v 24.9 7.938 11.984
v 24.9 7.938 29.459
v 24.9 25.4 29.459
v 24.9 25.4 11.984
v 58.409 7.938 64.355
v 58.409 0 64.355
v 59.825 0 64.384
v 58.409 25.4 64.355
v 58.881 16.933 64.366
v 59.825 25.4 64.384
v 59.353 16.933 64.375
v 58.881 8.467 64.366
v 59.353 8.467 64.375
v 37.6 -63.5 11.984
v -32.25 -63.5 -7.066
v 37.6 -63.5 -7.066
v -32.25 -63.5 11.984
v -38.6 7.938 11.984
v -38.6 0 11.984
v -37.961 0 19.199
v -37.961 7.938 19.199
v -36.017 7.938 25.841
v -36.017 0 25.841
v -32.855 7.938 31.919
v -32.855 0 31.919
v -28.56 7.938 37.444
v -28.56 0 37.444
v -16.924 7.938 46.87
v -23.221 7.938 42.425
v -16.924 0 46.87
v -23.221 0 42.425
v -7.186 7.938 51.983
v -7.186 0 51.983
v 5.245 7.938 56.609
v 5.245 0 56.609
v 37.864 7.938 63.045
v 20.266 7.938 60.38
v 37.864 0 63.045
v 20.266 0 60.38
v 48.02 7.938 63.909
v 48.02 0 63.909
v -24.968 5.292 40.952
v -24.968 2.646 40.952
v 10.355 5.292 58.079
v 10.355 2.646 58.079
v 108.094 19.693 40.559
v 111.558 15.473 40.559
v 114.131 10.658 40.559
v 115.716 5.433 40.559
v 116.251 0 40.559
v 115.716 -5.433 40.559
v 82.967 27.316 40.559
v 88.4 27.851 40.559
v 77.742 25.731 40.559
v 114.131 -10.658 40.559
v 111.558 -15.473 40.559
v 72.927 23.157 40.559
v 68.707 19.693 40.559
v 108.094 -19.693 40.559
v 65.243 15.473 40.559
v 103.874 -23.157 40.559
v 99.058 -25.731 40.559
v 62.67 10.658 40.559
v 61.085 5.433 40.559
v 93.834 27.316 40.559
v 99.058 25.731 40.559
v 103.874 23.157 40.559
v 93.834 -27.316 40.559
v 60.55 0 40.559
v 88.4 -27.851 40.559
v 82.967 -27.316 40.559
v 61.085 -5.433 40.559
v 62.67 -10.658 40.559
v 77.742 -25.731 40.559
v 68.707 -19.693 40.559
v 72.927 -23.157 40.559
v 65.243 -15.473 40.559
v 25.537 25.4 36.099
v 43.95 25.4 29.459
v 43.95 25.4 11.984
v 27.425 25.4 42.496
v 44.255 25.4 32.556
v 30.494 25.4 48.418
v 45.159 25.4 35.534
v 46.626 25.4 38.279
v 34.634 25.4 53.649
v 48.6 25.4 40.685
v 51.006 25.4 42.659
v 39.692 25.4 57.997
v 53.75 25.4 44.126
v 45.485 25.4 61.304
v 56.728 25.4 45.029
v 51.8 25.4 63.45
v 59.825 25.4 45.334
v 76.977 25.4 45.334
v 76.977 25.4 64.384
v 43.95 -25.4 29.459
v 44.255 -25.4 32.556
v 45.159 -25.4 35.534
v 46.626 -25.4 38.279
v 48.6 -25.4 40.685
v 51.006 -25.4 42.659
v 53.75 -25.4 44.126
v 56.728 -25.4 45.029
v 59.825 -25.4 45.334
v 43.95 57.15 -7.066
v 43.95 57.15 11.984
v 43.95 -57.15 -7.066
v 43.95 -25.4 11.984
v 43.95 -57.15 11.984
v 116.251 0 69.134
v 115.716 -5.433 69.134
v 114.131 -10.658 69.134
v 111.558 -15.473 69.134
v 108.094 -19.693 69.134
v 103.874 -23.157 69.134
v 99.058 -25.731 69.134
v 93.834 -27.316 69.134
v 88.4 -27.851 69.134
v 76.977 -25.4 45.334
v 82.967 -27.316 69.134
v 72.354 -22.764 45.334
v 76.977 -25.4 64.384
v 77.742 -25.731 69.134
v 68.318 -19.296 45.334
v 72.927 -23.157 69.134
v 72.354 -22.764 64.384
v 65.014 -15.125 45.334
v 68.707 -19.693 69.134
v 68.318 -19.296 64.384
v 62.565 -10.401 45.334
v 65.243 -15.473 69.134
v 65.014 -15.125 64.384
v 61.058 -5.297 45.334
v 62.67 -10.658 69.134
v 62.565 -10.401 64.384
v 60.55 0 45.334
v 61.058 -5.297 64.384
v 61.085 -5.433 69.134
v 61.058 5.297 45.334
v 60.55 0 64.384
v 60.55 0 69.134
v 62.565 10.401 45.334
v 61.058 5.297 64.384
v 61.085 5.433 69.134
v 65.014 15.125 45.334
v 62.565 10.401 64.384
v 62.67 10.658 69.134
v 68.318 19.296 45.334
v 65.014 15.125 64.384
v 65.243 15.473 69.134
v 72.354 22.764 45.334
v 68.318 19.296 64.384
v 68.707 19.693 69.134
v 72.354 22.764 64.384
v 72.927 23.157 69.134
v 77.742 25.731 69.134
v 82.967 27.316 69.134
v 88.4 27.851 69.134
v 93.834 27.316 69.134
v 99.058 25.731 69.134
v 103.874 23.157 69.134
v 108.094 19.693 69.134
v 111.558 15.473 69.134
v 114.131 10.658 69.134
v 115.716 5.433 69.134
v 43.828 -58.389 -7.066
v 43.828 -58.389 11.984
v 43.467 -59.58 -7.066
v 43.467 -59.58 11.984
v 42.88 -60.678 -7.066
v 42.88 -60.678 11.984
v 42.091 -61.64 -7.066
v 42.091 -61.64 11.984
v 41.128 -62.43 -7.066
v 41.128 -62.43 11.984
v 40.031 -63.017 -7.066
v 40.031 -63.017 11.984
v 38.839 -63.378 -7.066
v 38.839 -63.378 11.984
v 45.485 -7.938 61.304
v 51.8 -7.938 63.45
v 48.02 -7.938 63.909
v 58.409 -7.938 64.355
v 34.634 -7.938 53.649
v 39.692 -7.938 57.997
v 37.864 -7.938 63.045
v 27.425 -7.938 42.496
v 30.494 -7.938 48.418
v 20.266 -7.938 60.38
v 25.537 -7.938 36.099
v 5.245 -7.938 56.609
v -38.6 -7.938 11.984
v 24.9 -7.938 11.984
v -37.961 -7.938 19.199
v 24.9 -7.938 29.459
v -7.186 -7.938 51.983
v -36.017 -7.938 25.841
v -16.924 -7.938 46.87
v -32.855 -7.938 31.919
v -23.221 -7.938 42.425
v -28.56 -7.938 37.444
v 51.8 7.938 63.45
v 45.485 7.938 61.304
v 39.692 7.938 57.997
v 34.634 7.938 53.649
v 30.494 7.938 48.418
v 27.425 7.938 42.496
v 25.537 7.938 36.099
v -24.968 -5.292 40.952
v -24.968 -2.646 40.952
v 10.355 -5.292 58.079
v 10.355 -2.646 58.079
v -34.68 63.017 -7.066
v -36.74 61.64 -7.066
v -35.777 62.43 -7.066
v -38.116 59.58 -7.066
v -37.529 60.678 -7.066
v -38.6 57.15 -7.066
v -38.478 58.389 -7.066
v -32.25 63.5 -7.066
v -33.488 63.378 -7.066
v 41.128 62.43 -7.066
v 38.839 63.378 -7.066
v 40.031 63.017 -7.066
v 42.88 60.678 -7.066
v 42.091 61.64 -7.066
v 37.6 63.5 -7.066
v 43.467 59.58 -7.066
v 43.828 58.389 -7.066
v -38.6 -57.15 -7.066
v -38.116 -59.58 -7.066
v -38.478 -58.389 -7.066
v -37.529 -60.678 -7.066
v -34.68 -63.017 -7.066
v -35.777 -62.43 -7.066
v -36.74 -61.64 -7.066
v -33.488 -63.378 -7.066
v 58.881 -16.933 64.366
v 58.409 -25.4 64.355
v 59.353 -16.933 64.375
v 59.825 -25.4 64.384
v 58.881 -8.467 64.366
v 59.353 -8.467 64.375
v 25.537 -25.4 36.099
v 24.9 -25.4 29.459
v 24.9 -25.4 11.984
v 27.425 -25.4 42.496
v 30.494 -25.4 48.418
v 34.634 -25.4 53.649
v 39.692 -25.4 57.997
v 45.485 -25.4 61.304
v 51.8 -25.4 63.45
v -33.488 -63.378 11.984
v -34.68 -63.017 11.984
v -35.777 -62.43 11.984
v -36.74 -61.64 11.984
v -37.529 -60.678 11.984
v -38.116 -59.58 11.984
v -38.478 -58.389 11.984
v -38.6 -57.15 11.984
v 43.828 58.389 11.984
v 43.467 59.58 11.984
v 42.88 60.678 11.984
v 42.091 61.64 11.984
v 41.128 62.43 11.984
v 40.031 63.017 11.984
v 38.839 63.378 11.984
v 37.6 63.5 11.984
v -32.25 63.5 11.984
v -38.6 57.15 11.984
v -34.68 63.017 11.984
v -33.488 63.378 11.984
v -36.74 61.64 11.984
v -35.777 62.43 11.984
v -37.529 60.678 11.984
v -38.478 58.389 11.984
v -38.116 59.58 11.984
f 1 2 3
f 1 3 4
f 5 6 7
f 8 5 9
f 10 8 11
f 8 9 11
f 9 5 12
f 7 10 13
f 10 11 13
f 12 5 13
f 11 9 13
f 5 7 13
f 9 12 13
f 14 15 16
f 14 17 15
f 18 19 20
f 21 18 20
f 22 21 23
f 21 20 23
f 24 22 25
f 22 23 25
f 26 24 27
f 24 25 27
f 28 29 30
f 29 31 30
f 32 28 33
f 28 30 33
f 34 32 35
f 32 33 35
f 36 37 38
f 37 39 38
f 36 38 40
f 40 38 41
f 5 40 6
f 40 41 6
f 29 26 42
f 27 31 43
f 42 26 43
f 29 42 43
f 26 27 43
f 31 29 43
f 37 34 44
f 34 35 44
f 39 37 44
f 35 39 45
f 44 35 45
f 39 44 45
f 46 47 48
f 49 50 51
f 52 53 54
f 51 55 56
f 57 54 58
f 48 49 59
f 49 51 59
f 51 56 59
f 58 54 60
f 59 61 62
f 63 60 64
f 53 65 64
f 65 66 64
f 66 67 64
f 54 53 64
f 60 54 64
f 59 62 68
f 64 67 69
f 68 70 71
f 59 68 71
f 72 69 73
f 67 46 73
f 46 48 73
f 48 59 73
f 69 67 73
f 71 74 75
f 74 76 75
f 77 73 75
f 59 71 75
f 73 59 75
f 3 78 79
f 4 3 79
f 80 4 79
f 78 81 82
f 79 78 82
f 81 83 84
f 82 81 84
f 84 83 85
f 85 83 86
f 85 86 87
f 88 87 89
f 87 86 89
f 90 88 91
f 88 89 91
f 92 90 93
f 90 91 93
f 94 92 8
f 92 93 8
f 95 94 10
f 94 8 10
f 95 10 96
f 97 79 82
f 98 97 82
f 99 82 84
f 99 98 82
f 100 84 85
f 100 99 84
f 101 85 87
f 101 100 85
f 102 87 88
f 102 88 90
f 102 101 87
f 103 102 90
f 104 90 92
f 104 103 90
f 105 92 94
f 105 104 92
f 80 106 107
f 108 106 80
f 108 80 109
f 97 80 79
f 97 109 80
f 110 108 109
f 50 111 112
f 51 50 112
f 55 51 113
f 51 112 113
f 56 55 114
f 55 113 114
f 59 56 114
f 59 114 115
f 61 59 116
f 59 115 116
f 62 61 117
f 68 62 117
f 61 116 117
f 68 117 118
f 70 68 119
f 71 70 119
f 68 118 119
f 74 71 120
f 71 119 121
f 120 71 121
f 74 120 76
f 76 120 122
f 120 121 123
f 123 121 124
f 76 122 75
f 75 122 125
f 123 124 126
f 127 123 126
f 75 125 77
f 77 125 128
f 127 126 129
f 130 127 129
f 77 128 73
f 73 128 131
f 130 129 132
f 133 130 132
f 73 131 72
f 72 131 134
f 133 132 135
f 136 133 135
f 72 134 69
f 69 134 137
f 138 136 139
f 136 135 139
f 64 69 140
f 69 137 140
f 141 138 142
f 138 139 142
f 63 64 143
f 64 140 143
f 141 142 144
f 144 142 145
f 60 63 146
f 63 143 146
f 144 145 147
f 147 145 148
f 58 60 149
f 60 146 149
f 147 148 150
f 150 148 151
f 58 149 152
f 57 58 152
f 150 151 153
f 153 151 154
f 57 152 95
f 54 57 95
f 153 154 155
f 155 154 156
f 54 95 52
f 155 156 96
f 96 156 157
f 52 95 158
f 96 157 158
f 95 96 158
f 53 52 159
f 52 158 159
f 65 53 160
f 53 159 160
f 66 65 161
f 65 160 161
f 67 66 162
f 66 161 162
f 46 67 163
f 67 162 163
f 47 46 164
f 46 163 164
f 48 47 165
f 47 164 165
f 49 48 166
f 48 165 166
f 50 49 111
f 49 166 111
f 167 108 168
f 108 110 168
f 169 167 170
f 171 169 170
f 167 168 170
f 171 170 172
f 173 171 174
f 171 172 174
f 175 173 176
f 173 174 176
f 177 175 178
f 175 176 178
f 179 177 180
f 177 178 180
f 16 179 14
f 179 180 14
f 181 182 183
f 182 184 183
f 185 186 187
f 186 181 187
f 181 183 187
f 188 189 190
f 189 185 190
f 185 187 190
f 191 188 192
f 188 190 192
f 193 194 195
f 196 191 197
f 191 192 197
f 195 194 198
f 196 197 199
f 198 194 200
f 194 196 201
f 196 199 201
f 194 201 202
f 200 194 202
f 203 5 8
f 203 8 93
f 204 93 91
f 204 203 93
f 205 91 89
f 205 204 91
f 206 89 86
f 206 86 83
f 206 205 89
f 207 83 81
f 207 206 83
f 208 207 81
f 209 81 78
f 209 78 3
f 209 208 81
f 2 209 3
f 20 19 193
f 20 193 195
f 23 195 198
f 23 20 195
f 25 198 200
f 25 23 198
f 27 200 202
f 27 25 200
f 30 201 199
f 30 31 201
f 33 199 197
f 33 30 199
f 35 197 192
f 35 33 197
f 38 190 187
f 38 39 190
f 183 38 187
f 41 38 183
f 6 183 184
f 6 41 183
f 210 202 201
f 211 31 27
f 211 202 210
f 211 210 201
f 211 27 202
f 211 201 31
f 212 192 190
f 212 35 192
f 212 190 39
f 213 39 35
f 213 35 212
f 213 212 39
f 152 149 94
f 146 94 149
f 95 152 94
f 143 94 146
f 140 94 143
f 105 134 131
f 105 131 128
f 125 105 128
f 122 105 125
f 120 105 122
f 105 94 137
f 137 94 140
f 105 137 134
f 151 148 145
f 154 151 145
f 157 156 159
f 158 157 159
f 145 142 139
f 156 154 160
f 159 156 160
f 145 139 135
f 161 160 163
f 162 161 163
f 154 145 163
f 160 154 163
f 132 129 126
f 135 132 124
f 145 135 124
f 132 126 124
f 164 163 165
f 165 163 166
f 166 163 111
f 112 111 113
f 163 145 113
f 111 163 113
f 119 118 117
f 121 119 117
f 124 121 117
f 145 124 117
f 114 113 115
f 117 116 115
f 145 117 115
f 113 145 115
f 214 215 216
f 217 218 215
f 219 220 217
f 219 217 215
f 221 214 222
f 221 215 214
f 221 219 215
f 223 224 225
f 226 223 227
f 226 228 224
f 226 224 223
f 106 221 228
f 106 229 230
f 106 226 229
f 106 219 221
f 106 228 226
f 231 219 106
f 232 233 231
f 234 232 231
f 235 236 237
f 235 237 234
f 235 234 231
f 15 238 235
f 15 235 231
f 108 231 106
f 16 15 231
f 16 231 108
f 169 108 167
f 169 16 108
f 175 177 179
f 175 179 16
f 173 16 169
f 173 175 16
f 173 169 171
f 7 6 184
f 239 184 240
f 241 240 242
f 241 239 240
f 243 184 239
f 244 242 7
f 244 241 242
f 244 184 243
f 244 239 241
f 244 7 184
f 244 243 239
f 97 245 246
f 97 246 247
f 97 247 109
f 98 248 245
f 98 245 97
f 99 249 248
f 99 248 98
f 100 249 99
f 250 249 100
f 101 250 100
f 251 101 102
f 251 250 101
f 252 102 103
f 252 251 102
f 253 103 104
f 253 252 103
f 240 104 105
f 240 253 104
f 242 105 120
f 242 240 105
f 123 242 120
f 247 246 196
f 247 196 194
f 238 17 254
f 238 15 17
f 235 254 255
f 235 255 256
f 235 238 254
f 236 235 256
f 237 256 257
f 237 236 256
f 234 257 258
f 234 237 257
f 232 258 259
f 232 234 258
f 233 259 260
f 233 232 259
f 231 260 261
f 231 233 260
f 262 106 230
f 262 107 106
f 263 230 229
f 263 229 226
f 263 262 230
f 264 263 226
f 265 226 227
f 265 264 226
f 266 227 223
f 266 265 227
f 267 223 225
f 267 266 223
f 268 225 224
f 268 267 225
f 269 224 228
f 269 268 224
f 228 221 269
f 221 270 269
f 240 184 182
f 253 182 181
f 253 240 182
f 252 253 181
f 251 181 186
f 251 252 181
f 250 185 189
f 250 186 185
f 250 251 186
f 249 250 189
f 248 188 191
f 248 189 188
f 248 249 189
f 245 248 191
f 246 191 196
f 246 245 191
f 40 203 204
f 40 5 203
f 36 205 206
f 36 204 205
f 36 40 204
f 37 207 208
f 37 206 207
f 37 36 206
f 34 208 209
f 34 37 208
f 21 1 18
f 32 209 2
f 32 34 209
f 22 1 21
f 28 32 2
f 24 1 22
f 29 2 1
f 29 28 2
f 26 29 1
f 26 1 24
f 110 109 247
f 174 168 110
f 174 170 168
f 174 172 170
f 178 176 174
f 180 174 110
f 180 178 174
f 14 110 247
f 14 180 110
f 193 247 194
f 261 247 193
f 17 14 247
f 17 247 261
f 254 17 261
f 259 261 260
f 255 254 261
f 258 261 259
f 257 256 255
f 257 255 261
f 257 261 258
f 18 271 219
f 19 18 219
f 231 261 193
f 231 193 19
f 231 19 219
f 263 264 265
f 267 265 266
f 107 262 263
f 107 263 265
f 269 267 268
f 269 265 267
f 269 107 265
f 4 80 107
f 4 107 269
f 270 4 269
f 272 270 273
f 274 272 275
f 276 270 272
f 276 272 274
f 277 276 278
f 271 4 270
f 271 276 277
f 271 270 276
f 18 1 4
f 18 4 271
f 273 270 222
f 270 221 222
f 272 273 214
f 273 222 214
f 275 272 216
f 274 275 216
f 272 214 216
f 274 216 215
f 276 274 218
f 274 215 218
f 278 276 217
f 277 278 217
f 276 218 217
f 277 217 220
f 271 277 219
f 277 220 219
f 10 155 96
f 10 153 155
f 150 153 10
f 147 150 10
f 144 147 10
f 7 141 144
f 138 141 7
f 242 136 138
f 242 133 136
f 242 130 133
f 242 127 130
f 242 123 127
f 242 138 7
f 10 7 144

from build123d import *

# Parameters (mm, degrees)
F1_DEPTH = 63.5
F2_DEPTH = 25.4
F3_DEPTH = 7.9375
F5_R     = 6.35


# Not quite as in the source:
# - a feature names something its author has since deleted; it is built from what else it names


with BuildPart() as f1:
    # F0 (on Front) → F1 (new body, symmetric)
    with BuildSketch(Plane.XZ):
        Polygon((24.9004629219, 11.984025088), (-38.5995370781, 11.984025088), (-38.5995370781, -7.065974912), (43.9504629219, -7.065974912), (43.9504629219, 11.984025088), align=None)
    extrude(amount=F1_DEPTH, both=True)

    # F0 (on Front) → F2 (join, symmetric)
    with BuildSketch(Plane.XZ):
        with BuildLine():
            Line((24.9004629219, 29.459225088), (24.9004629219, 11.984025088))
            Line((24.9004629219, 11.984025088), (43.9504629219, 11.984025088))
            Line((43.9504629219, 11.984025088), (43.9504629219, 29.459225088))
            ThreePointArc((43.9504629219, 29.459225088), (48.6001427706, 40.6845452393), (59.8254629219, 45.334225088))
            Line((59.8254629219, 45.334225088), (65.5219778419, 45.334225088))
            Line((65.5219778419, 45.334225088), (88.4004629219, 45.334225088))
            Line((88.4004629219, 45.334225088), (88.4004629219, 64.384225088))
            Line((88.4004629219, 64.384225088), (65.4512095848, 64.384225088))
            Line((65.4512095848, 64.384225088), (59.8254629219, 64.384225088))
            add(Edge.make_bspline(
                [(58.4085351023, 64.3554704527), (58.8803787931, 64.3662992509), (59.3526984445, 64.3758829837), (59.8254629219, 64.384225088)],
                knots=[110.4908750185, 110.4908750185, 110.4908750185, 110.4908750185, 111.5045361635, 111.5045361635, 111.5045361635, 111.5045361635], degree=3))
            ThreePointArc((58.4085351023, 64.3554704527), (34.6337794817, 53.6487829684), (24.9004629219, 29.459225088))
        make_face()
    extrude(amount=F2_DEPTH, both=True)

    # F0 (on Front) → F3 (join, symmetric)
    with BuildSketch(Plane.XZ):
        with BuildLine():
            add(Edge.make_bspline(
                [(-38.5995370781, 11.984025088), (-38.8000023371, 47.2016469024), (6.976730171, 63.1751121082), (58.4085351023, 64.3554704527)],
                knots=[0, 0, 0, 0, 110.4908750185, 110.4908750185, 110.4908750185, 110.4908750185], degree=3))
            Line((-38.5995370781, 11.984025088), (24.9004629219, 11.984025088))
            Line((24.9004629219, 11.984025088), (24.9004629219, 29.459225088))
            ThreePointArc((24.9004629219, 29.459225088), (34.6337794817, 53.6487829684), (58.4085351023, 64.3554704527))
        make_face()
    extrude(amount=F3_DEPTH, both=True)

    # F0 (on Front) → F4 (revolve)
    with BuildSketch(Plane.XZ):
        Polygon((88.4004629219, 69.134025088), (88.4004629219, 64.384225088), (88.4004629219, 45.334225088), (88.4004629219, 40.559025088), (116.2512095848, 40.559025088), (116.2512095848, 69.134025088), align=None)
    revolve(axis=Axis((88.4004629219, 0, 54.846525088), (0, 0, -1)))

    # F5
    f5_edges = [f1.edges().sort_by_distance(p)[0] for p in [
        (-38.599537, -63.5, 2.459025),
        (43.950463, -63.5, 2.459025),
        (-38.599537, 63.5, 2.459025),
        (43.950463, 63.5, 2.459025),
    ]]
    fillet(f5_edges, radius=F5_R)


solid = f1.part
